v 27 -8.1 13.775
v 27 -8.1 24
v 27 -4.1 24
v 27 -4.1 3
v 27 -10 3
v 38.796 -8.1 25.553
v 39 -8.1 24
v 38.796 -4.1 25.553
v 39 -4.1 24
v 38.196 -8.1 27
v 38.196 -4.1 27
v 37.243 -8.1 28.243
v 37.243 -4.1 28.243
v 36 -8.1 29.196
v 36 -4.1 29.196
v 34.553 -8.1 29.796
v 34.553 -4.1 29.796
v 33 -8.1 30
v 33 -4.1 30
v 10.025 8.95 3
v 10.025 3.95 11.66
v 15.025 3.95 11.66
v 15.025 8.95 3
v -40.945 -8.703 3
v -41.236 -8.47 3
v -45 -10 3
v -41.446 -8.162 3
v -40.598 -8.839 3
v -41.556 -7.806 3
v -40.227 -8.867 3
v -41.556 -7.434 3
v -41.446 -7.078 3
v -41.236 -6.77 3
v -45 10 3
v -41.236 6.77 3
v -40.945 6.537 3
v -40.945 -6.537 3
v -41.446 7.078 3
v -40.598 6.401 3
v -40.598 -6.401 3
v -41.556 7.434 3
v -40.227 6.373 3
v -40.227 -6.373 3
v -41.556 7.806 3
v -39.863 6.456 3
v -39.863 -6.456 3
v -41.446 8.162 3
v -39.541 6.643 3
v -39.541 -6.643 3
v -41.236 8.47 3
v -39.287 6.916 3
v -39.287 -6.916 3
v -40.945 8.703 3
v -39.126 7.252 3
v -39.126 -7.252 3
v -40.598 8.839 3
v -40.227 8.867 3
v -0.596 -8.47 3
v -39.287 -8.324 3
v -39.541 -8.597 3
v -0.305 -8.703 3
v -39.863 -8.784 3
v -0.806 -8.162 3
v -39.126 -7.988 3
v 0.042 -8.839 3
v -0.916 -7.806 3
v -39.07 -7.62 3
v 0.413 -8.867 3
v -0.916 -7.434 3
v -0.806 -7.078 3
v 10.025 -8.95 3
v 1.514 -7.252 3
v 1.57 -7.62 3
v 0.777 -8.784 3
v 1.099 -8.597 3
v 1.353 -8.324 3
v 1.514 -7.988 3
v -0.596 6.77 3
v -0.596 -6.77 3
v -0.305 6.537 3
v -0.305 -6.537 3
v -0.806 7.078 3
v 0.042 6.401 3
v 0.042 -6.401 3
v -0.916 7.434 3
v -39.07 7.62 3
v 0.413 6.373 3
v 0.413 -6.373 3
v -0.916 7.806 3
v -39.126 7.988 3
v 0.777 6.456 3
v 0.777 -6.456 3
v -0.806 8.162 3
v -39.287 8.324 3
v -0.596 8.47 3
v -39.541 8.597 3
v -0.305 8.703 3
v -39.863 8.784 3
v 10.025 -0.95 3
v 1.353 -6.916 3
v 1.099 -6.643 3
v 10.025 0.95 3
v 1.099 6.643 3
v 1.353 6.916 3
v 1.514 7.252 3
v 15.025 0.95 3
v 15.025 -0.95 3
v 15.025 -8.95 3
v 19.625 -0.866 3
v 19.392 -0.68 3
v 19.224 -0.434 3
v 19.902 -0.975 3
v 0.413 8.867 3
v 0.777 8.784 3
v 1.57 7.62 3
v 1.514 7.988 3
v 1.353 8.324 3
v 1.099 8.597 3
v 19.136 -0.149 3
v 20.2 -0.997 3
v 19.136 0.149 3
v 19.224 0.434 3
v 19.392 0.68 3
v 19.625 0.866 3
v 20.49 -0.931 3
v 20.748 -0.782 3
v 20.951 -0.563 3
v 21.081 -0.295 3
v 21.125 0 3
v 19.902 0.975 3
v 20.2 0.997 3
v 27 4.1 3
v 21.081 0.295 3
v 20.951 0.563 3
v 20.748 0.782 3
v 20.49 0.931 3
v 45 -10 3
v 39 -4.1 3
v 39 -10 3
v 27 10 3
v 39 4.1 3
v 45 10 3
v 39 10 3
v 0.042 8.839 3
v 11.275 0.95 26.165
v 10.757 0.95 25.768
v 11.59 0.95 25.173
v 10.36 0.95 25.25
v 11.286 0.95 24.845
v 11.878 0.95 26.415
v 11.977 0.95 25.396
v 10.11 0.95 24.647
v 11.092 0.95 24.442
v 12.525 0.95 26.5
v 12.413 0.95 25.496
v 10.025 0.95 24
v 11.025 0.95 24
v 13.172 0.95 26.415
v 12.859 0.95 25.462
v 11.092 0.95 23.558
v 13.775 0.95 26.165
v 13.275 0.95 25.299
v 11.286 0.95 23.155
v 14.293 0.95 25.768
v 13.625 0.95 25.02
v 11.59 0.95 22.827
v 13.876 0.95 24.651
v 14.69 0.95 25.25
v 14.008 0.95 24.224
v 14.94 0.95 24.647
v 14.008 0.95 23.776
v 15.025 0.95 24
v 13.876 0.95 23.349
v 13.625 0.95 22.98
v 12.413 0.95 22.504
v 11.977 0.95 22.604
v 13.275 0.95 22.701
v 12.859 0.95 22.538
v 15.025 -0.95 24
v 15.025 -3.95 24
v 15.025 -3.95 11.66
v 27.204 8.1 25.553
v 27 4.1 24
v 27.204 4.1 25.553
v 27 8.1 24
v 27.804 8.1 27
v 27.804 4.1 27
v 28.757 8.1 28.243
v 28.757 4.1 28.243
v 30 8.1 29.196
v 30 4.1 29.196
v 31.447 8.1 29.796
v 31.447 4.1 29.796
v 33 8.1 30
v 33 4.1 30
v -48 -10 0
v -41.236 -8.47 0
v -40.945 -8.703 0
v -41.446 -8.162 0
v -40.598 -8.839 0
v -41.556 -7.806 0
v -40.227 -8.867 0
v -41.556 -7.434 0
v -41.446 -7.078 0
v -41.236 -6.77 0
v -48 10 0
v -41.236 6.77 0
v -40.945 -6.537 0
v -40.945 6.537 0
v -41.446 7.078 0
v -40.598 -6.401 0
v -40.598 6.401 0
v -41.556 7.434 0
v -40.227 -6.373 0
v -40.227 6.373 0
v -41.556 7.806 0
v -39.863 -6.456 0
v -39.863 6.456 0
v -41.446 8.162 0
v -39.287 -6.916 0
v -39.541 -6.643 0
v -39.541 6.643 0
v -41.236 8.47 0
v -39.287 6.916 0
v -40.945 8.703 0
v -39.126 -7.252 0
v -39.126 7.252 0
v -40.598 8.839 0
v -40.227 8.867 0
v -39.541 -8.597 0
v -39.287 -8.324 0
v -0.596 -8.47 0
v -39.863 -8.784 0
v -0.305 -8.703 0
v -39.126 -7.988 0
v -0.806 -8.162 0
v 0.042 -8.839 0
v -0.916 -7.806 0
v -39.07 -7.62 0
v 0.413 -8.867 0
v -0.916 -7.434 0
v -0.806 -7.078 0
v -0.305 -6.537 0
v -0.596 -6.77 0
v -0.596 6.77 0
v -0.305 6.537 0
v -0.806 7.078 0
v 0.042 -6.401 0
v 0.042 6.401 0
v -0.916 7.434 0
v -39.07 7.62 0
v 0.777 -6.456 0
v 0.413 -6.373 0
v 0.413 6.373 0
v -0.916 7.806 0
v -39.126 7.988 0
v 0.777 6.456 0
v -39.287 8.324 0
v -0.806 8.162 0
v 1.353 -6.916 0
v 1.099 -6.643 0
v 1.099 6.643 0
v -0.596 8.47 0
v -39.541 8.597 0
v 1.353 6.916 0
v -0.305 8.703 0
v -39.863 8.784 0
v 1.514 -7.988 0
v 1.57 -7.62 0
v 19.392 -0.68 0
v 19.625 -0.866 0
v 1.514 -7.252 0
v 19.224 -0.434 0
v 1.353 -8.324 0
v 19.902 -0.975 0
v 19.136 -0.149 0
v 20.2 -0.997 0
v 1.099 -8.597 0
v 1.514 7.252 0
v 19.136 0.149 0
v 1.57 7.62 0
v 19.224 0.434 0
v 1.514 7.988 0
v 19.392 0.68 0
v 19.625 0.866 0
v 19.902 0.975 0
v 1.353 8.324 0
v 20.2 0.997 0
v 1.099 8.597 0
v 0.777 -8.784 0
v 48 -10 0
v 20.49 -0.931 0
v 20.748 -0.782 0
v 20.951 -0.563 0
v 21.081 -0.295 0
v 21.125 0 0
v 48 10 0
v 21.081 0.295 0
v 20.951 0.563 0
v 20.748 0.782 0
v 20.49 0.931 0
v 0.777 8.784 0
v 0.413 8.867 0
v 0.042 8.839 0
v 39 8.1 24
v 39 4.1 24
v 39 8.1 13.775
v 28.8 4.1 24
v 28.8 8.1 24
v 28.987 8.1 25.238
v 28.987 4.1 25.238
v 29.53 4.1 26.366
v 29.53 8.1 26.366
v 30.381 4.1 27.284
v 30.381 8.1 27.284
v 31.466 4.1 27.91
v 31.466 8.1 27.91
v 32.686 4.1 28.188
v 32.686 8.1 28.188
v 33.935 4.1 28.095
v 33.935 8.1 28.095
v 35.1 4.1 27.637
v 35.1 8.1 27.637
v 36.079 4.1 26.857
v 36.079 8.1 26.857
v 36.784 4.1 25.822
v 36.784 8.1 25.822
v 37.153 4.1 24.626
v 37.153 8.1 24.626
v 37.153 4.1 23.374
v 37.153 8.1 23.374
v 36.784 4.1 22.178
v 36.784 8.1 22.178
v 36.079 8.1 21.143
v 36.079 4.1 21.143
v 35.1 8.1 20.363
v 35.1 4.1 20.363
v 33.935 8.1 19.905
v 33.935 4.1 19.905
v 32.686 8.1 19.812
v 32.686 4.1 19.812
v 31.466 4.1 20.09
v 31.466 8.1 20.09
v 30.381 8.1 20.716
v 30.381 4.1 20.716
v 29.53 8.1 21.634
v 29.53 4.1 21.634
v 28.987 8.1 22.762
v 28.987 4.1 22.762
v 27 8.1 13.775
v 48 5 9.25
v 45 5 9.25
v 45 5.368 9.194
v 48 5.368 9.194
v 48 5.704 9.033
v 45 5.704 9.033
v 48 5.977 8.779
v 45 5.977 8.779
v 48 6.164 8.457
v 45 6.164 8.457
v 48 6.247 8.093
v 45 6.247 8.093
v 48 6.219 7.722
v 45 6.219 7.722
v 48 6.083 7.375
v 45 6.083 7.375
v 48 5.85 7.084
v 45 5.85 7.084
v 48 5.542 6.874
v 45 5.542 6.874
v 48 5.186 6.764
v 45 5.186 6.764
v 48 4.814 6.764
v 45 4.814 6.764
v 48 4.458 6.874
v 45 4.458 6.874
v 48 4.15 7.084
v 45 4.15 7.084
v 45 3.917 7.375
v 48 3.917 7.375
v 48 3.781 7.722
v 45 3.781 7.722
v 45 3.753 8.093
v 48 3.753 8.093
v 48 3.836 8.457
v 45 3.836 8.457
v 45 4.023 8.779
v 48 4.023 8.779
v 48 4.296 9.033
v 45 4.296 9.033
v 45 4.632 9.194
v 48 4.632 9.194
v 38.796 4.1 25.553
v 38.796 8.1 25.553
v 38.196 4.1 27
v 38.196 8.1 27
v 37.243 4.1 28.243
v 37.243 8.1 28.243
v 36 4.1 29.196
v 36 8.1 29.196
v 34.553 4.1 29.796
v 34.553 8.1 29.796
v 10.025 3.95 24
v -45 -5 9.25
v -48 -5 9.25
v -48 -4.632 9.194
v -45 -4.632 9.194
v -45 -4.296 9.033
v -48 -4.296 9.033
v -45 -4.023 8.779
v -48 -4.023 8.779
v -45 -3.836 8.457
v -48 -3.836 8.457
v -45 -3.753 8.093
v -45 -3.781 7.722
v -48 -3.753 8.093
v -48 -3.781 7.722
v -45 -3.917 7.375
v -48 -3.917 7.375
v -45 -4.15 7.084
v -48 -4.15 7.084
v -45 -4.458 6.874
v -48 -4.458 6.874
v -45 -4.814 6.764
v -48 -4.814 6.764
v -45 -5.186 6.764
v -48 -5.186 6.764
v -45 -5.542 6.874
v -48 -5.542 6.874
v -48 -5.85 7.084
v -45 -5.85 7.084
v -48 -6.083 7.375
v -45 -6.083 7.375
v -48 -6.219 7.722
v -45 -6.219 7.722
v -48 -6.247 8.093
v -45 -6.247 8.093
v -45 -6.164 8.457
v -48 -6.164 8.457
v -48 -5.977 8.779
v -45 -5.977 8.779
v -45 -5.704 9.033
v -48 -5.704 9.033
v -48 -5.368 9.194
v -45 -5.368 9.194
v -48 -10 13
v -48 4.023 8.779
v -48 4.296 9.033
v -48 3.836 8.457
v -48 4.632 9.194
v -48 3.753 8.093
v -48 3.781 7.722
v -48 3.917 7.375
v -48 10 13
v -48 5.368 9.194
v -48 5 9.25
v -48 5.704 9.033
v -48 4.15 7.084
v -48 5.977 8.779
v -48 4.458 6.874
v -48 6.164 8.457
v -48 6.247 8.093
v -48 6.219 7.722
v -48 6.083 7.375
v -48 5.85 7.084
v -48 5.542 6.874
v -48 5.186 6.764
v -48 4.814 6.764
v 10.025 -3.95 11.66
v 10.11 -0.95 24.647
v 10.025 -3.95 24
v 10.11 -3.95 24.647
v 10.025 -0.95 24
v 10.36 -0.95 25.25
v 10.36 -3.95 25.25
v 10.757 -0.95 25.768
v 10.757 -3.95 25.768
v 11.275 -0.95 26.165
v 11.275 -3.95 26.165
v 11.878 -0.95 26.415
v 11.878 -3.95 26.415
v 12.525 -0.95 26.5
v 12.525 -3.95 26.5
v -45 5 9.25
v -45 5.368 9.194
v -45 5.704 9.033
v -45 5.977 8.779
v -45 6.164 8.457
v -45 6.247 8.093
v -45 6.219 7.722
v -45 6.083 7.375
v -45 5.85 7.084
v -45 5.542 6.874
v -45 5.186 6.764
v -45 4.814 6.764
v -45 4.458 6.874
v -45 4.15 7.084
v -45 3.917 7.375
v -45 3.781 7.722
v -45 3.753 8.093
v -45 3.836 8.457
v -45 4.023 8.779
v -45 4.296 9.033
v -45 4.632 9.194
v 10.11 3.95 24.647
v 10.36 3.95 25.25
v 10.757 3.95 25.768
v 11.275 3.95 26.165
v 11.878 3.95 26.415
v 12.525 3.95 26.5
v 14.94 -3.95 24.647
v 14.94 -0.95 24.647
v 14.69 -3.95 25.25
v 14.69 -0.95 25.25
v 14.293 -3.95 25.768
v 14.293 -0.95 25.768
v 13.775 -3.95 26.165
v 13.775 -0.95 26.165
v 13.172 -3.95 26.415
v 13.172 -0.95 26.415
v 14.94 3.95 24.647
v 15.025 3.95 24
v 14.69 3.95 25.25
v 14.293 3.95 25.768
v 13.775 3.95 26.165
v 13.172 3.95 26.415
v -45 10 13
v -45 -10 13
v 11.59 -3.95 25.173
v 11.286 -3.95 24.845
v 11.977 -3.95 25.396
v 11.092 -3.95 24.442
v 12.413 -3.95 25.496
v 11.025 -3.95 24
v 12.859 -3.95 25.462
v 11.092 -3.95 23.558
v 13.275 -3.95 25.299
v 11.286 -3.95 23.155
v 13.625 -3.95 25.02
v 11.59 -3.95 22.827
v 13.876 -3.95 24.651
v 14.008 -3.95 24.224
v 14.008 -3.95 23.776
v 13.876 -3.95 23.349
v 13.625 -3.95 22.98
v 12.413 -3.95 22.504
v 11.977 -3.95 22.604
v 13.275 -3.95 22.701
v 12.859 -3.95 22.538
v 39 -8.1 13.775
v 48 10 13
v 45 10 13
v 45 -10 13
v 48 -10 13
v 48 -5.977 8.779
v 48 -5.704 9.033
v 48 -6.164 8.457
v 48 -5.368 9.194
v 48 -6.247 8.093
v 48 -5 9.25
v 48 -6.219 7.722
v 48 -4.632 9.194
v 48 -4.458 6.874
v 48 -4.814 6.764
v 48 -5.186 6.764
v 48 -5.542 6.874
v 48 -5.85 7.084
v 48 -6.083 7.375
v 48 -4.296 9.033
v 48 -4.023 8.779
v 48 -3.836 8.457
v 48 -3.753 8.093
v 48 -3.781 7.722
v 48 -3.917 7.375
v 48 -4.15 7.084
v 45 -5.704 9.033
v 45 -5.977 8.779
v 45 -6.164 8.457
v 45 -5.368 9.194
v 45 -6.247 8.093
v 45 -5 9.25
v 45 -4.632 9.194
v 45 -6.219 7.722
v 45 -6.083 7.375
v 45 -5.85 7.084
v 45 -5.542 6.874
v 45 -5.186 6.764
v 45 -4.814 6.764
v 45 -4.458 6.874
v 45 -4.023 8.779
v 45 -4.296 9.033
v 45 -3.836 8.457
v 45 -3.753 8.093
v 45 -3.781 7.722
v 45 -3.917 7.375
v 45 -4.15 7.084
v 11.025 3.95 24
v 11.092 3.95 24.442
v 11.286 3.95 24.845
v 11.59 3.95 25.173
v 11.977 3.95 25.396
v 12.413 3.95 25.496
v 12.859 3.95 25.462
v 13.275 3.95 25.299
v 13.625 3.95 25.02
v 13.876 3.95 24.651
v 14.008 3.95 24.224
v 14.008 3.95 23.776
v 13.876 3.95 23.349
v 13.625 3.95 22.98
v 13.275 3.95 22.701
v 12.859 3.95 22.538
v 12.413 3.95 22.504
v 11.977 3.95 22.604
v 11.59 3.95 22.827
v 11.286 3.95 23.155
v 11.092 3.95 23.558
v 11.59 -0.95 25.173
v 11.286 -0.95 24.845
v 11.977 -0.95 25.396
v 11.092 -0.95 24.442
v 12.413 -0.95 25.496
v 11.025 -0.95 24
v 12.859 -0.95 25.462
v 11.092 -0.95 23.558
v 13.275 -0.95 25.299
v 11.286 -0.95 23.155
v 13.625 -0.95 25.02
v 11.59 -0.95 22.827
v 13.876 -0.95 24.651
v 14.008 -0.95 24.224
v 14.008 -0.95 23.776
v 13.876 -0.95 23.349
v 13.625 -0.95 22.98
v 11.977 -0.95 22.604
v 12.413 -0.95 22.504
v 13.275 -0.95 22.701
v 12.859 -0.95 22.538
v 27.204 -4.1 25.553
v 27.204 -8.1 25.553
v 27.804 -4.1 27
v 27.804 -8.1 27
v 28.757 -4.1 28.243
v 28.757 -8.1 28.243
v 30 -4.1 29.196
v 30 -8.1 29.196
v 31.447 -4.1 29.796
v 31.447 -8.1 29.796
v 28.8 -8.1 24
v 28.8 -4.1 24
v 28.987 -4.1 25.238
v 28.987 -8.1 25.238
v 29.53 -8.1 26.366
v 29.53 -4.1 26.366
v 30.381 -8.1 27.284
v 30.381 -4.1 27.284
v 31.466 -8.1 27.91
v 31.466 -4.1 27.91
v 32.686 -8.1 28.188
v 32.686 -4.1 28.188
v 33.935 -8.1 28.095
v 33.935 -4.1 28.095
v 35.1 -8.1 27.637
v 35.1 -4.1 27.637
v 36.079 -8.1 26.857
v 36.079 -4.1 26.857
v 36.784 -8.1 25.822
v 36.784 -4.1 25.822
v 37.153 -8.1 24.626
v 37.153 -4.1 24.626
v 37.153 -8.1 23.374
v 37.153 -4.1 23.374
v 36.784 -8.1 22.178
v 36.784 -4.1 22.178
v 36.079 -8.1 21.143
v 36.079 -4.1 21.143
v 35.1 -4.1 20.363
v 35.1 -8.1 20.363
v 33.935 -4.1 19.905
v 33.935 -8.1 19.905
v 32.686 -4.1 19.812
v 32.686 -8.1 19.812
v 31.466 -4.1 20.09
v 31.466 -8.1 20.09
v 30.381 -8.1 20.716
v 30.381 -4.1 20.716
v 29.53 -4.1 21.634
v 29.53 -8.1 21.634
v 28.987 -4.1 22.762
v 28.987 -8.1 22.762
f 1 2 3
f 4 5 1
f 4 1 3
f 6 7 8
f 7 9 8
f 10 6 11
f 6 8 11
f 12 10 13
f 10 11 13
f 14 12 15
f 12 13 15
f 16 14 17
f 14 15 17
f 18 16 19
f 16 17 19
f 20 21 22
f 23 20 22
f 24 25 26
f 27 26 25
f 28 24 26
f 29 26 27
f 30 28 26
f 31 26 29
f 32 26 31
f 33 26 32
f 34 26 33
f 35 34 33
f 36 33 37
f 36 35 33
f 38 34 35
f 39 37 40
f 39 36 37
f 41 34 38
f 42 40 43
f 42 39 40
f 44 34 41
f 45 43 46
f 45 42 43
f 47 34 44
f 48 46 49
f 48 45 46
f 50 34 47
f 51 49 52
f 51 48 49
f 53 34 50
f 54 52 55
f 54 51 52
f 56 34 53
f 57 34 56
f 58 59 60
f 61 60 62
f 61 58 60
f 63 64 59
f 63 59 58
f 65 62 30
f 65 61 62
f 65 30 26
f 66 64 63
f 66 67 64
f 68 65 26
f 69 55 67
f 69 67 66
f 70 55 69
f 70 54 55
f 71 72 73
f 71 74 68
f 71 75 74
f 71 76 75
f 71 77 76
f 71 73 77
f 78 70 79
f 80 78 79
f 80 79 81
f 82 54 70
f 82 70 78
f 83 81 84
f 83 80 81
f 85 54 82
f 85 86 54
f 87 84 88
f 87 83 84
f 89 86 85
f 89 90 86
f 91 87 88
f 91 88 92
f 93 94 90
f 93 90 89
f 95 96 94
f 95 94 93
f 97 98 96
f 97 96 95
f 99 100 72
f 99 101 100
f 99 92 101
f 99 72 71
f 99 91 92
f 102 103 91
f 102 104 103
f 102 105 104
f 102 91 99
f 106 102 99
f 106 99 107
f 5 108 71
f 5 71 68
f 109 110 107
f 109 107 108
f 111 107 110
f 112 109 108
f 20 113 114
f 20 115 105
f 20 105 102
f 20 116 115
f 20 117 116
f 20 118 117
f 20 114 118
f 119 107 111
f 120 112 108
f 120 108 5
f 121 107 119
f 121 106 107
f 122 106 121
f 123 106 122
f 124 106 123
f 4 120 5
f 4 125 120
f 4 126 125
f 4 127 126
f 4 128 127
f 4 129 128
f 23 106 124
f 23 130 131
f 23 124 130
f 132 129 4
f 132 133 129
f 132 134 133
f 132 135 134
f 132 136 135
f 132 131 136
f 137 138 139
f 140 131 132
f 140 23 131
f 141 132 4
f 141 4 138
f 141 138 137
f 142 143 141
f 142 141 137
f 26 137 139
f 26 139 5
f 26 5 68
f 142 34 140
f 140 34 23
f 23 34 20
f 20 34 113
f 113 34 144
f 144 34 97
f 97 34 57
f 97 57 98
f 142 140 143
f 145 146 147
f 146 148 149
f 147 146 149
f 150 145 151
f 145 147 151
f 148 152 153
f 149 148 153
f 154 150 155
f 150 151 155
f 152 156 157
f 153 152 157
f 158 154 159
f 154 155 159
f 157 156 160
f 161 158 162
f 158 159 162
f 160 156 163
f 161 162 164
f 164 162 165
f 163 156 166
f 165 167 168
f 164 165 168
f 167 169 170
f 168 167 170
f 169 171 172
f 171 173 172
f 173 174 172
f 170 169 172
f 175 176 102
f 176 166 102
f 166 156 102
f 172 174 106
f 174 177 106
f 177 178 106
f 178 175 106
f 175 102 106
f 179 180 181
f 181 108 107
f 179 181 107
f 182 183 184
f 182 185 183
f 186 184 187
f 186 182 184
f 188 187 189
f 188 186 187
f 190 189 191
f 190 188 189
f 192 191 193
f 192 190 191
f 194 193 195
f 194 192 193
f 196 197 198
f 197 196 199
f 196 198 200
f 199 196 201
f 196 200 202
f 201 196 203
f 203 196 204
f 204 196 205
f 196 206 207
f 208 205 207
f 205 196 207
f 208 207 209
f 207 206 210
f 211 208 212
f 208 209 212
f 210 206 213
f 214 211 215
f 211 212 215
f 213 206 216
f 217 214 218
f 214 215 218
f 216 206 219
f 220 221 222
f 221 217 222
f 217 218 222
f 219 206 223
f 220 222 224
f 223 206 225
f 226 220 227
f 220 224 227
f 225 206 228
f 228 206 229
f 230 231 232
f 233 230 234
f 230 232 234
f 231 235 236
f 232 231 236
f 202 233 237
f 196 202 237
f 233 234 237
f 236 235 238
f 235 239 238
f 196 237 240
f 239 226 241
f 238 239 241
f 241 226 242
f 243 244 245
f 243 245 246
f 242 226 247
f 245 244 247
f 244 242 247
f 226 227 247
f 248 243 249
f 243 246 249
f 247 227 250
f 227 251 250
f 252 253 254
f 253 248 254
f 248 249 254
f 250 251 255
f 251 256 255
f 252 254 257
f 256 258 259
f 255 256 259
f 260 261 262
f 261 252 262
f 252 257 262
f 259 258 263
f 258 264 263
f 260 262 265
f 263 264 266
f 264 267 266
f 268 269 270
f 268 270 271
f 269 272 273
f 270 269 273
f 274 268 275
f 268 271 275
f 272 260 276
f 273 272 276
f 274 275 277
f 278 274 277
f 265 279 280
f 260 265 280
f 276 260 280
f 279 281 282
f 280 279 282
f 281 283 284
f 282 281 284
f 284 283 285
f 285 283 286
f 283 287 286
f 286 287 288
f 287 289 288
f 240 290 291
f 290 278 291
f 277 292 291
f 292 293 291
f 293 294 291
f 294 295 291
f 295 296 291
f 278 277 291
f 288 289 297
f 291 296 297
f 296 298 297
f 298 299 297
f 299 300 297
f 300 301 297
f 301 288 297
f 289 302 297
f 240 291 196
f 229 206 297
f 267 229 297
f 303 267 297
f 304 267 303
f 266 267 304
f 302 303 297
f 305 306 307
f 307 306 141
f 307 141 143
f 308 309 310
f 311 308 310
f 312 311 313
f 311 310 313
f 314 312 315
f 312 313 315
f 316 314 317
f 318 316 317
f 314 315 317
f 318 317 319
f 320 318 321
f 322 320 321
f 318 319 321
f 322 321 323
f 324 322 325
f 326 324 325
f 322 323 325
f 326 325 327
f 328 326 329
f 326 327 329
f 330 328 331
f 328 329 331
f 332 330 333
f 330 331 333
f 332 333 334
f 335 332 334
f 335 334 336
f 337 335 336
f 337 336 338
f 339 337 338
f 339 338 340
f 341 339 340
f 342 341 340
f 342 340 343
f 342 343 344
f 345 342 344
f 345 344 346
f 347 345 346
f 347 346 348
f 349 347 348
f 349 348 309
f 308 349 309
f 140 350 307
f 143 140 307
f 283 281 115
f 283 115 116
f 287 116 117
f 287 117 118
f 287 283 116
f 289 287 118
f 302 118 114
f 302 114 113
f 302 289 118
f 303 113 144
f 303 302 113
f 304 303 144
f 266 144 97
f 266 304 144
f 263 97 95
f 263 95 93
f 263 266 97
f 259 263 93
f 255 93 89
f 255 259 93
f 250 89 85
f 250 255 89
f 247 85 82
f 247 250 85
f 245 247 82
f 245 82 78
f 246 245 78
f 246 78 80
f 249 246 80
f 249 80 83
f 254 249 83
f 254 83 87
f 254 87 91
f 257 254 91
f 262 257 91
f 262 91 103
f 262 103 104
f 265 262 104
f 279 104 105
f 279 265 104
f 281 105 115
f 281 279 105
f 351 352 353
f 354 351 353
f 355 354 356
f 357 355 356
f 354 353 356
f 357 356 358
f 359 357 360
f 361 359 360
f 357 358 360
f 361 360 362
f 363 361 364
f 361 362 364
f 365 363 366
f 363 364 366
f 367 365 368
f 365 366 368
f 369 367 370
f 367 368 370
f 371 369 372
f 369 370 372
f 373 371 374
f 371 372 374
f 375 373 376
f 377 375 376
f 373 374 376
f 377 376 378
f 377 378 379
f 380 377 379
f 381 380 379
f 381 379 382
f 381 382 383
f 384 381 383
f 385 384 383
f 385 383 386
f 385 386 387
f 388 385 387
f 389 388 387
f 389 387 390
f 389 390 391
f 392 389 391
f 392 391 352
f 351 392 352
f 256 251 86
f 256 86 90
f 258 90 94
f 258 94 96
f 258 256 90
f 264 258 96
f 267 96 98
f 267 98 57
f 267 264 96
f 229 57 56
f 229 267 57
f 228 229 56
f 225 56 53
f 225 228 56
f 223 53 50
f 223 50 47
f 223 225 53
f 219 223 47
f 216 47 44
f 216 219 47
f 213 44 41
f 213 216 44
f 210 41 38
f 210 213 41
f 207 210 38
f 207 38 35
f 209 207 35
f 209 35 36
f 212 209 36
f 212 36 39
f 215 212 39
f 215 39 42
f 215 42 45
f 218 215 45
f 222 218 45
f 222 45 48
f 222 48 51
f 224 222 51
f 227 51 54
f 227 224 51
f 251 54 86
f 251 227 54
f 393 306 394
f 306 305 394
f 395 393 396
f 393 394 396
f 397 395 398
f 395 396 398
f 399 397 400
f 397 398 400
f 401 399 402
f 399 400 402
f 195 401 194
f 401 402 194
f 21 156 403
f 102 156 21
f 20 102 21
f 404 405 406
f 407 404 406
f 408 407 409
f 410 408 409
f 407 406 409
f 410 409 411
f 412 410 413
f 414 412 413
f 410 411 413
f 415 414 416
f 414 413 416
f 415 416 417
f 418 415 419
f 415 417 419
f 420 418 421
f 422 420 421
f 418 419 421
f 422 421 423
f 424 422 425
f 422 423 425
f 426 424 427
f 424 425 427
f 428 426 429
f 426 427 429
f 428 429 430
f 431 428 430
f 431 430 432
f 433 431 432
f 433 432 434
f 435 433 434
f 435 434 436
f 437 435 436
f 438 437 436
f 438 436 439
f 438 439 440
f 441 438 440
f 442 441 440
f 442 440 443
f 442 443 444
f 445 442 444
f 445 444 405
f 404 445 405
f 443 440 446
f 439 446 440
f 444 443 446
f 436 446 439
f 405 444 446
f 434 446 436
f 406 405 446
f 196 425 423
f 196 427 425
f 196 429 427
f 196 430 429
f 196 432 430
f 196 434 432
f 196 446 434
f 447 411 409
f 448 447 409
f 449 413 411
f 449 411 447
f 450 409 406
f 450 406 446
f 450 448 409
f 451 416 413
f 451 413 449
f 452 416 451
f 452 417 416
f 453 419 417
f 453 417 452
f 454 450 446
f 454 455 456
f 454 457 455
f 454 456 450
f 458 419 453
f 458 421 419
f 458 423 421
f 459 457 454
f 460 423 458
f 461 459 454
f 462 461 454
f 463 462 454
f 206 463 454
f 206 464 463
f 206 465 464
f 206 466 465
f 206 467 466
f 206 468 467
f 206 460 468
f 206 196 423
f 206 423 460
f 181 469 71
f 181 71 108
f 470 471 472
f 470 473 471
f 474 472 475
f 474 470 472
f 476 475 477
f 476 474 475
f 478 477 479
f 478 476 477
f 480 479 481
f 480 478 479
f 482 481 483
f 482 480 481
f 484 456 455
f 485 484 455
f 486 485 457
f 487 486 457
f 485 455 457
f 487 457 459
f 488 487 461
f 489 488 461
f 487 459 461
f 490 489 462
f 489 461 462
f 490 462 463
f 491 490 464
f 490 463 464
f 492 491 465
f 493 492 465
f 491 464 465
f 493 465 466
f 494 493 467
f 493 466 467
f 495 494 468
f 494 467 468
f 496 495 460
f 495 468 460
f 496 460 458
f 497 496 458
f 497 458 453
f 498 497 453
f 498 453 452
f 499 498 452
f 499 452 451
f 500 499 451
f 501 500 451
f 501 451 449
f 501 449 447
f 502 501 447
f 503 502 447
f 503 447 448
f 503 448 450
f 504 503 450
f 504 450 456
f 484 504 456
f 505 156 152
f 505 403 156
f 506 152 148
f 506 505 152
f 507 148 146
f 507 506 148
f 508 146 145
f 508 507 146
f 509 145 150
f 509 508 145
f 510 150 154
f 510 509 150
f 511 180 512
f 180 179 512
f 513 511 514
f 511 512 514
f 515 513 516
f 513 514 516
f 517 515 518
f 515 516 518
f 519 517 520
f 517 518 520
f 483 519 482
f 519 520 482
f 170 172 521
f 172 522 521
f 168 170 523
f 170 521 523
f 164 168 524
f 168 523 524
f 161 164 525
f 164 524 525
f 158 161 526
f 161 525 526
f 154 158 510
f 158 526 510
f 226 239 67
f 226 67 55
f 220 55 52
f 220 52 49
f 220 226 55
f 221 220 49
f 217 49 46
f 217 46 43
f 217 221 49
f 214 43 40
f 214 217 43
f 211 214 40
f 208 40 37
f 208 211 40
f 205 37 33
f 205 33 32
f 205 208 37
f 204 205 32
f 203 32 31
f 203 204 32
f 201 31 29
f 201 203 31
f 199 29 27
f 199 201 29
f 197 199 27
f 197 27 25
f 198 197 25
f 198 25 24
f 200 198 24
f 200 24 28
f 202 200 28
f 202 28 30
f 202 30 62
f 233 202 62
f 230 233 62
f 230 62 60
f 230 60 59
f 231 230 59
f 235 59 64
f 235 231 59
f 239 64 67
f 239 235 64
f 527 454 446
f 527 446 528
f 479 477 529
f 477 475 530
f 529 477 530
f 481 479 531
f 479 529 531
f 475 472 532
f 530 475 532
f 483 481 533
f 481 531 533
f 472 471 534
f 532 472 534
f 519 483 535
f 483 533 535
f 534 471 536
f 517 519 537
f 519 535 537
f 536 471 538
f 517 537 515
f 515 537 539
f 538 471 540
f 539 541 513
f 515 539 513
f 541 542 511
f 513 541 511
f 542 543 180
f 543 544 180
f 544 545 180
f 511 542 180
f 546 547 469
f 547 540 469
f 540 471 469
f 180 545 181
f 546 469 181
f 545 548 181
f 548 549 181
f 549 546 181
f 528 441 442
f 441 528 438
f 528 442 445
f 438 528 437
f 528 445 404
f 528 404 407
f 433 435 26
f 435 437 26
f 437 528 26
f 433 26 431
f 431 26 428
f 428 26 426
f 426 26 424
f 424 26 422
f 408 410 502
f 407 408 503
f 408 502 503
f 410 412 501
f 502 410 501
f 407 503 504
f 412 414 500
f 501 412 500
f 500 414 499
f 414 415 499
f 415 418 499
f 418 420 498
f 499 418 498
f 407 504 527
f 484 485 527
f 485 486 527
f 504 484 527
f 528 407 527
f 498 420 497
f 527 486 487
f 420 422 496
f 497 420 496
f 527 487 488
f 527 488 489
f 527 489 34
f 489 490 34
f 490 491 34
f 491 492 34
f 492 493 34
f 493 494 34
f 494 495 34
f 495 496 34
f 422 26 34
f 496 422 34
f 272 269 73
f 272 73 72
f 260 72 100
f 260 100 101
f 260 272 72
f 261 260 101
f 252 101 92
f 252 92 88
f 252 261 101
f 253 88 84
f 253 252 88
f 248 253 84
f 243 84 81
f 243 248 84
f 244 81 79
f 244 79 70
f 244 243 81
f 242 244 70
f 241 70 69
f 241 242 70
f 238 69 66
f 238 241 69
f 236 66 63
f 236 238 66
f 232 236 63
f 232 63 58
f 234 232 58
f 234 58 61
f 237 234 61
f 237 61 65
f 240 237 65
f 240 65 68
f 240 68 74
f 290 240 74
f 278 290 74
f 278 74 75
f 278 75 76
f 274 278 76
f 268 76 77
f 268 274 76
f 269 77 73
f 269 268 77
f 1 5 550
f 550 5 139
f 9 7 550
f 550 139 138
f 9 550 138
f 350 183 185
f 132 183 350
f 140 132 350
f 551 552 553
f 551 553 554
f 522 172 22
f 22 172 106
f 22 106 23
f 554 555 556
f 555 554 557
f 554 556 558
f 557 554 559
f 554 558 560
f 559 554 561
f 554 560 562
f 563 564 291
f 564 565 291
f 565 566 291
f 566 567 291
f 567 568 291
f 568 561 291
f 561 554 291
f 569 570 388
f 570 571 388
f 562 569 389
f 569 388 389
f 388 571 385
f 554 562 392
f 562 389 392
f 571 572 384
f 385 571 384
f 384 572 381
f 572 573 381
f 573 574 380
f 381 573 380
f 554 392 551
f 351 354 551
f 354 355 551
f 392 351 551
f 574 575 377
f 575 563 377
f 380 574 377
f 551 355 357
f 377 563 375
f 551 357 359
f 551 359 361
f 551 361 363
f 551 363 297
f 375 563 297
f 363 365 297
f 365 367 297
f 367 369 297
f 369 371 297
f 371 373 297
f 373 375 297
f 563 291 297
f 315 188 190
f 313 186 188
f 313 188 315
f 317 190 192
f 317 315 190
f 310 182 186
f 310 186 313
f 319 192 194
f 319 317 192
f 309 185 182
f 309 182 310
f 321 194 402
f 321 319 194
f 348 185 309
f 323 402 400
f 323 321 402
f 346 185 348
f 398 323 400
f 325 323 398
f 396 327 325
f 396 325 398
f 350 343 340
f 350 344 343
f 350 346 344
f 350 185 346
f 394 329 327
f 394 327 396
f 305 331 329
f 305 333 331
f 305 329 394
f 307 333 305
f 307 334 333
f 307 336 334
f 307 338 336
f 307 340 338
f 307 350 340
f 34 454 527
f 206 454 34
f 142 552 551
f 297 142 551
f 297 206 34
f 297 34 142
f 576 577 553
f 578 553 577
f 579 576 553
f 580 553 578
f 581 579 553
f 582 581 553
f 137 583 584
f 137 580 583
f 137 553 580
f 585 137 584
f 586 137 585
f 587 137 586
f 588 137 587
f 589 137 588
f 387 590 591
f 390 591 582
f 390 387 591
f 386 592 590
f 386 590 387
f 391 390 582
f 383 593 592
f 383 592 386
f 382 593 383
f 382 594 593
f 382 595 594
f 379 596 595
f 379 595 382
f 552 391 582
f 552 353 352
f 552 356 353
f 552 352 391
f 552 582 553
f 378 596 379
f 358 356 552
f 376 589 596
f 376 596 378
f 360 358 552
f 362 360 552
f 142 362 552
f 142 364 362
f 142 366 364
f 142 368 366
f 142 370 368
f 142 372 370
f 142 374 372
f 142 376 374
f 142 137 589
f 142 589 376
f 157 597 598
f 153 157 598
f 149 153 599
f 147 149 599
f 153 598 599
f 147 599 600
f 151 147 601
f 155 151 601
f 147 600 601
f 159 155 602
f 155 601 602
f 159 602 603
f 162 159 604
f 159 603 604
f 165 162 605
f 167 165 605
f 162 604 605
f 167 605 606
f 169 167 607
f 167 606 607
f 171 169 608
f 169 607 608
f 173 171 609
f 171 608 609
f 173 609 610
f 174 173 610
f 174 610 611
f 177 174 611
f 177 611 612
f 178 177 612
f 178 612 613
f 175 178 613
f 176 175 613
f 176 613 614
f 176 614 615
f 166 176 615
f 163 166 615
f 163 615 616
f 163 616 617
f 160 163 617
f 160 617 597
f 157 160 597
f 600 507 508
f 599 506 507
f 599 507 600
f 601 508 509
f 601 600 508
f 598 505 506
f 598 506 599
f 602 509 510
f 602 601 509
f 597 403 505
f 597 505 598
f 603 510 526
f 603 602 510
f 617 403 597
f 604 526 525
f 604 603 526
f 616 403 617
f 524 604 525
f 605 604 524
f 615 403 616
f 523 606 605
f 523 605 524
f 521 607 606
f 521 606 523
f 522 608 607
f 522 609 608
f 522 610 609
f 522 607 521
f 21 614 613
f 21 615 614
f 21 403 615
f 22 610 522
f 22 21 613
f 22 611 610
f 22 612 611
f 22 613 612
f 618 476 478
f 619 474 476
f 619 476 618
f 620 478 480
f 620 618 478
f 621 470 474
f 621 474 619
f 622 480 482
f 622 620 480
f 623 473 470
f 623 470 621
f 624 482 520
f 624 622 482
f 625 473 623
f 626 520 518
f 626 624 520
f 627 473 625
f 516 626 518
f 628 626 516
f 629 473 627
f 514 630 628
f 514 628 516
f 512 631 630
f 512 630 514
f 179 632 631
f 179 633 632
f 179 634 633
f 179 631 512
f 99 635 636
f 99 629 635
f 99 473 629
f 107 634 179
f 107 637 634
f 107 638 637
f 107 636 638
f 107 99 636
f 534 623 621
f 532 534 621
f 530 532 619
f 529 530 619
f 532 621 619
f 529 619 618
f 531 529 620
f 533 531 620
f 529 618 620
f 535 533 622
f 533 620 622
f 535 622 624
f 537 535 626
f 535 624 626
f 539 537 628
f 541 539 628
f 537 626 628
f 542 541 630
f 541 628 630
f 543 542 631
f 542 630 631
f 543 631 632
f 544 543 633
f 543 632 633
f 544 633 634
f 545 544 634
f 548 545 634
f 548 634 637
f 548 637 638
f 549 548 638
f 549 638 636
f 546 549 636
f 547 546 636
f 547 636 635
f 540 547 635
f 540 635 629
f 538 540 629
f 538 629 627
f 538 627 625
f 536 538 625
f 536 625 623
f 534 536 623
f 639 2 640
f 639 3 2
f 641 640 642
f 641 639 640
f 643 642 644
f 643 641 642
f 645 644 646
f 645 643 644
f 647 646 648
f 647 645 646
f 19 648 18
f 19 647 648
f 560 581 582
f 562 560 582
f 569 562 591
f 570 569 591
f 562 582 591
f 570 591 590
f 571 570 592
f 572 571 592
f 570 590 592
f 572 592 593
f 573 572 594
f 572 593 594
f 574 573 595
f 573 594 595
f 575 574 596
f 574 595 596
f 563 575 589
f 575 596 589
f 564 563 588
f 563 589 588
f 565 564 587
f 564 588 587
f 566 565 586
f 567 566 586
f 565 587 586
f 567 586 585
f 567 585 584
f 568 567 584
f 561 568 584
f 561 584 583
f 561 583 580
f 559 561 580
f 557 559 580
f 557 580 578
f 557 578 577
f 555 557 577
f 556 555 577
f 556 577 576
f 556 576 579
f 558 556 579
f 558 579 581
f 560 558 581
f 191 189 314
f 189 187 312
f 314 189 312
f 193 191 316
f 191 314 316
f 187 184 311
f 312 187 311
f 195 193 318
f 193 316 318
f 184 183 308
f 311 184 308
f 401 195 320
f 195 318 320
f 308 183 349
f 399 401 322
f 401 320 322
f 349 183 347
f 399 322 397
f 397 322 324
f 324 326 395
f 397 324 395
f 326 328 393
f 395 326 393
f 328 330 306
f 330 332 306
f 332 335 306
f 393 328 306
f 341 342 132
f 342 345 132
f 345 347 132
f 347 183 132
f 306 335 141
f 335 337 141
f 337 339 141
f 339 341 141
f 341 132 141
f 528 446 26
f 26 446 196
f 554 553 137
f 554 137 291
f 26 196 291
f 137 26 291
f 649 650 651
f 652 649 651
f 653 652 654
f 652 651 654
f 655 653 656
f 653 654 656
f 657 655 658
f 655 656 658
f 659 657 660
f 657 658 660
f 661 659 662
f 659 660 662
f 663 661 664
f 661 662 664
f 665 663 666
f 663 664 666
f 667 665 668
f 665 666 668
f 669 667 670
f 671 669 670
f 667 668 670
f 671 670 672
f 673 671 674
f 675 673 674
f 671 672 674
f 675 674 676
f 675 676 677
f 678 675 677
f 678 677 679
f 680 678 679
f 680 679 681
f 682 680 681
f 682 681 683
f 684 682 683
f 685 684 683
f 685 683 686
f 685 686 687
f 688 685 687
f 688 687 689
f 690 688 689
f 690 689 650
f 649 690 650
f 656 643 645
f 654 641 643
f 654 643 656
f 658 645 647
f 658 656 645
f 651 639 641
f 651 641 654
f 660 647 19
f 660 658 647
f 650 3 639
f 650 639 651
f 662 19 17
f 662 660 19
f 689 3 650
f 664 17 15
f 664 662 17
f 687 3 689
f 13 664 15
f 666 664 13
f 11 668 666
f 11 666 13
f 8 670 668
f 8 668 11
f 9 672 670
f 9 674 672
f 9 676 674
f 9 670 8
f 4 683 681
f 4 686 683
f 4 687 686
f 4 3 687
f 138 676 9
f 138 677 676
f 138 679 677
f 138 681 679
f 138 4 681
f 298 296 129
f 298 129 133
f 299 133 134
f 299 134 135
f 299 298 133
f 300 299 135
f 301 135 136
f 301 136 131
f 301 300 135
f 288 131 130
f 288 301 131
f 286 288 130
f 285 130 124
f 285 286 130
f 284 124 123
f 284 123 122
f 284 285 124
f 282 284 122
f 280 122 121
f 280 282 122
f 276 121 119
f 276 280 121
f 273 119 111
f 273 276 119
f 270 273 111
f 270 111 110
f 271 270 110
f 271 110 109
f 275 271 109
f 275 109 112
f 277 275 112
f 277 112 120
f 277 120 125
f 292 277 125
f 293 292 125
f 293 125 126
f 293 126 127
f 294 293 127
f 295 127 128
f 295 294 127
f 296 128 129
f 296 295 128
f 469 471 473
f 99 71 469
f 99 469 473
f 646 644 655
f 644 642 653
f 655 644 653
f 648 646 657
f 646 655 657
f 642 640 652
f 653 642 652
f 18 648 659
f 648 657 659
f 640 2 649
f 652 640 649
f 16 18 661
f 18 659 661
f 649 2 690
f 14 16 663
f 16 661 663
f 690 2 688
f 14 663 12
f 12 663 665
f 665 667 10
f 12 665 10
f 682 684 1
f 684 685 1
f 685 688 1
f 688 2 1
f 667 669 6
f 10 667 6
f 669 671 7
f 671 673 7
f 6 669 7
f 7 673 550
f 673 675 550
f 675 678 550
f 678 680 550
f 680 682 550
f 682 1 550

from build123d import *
from OCP.BRepFilletAPI import BRepFilletAPI_MakeChamfer

# Parameters (mm, degrees)
SCHIZZO1_W                   = 96
SCHIZZO1_H                   = 20
SCHIZZO1_R                   = 1
SCHIZZO1_R_2                 = 1.25
ESTRUSIONE_ESTRUSIONE1_DEPTH = 3
SCHIZZO2_W                   = 3
SCHIZZO2_H                   = 20
ESTRUSIONE_ESTRUSIONE2_DEPTH = 10
SCHIZZO3_R                   = 1.25
TAGLIO_ESTRUSIONE1_DEPTH     = 98.390964673
SCHIZZO4_W                   = 12
SCHIZZO4_H                   = 4
ESTRUSIONE_ESTRUSIONE3_DEPTH = 27
RACCORDO1_R                  = 6
SCHIZZO5_R                   = 4.2
TAGLIO_ESTRUSIONE2_DEPTH     = 60.427350606
SMUSSO1_SIZE                 = 10.775435457
SMUSSO1_SIZE_2               = 1.9
SCHIZZO6_W                   = 5
SCHIZZO6_H                   = 3
ESTRUSIONE_ESTRUSIONE4_DEPTH = 23.5
RACCORDO2_R                  = 2.5
SCHIZZO7_R                   = 1.5
TAGLIO_ESTRUSIONE3_DEPTH     = 59.297534253
SMUSSO2_SIZE                 = 5
SMUSSO2_SIZE2                = 8.660254038


with BuildPart() as part:
    # Schizzo1 → Estrusione-Estrusione1 (new body)
    with BuildSketch(Plane.XY):
        Rectangle(SCHIZZO1_W, SCHIZZO1_H)
        with Locations((20.125, 0)):
            Circle(SCHIZZO1_R, mode=Mode.SUBTRACT)
        with Locations((-40.32, 7.62)):
            Circle(SCHIZZO1_R_2, mode=Mode.SUBTRACT)
        with Locations((0.32, 7.62)):
            Circle(SCHIZZO1_R_2, mode=Mode.SUBTRACT)
        with Locations((0.32, -7.62)):
            Circle(SCHIZZO1_R_2, mode=Mode.SUBTRACT)
        with Locations((-40.32, -7.62)):
            Circle(SCHIZZO1_R_2, mode=Mode.SUBTRACT)
    extrude(amount=ESTRUSIONE_ESTRUSIONE1_DEPTH)

    # Schizzo2 → Estrusione-Estrusione2 (add)
    with BuildSketch(Plane.XY.offset(3)):
        with Locations((-46.5, 0)):
            Rectangle(SCHIZZO2_W, SCHIZZO2_H)
        with Locations((46.5, 0)):
            Rectangle(SCHIZZO2_W, SCHIZZO2_H)
    extrude(amount=ESTRUSIONE_ESTRUSIONE2_DEPTH)

    # Schizzo3 → Taglio-Estrusione1 (cut, through all)
    with BuildSketch(Plane.ZY.offset(48)):
        with Locations((8, -5)):
            Circle(SCHIZZO3_R)
        with Locations((8, 5)):
            Circle(SCHIZZO3_R)
    extrude(amount=-TAGLIO_ESTRUSIONE1_DEPTH, mode=Mode.SUBTRACT)

    # Schizzo4 → Estrusione-Estrusione3 (add)
    with BuildSketch(Plane.XY.offset(3)):
        with Locations((33, -6.1)):
            Rectangle(SCHIZZO4_W, SCHIZZO4_H)
        with Locations((33, 6.1)):
            Rectangle(SCHIZZO4_W, SCHIZZO4_H)
    extrude(amount=ESTRUSIONE_ESTRUSIONE3_DEPTH)

    # Raccordo1
    raccordo1_edges = [part.edges().sort_by_distance(p)[0] for p in [
        (27, 6.1, 30),
        (39, 6.1, 30),
        (39, -6.1, 30),
        (27, -6.1, 30),
    ]]
    fillet(raccordo1_edges, radius=RACCORDO1_R - 0.0001)  # a hair under: the kernel refuses the full size

    # Schizzo5 → Taglio-Estrusione2 (cut, through all)
    with BuildSketch(Plane(origin=(0, 8.1, 0), x_dir=(1, 0, 0), z_dir=(0, 1, 0))):
        with Locations(Location((33, -24, 0), (0, 0, 180))):
            Circle(SCHIZZO5_R)
    extrude(amount=-TAGLIO_ESTRUSIONE2_DEPTH, mode=Mode.SUBTRACT)

    # Smusso1
    smusso1_edges_1 = [part.edges().sort_by_distance(p)[0] for p in [
        (33, -8.1, 3),
    ]]
    smusso1_side_1 = [part.faces().sort_by_distance(p)[0] for p in [
        (33, -8.1, 3.038),
    ]]
    smusso1_edges_2 = [part.edges().sort_by_distance(p)[0] for p in [
        (33, 8.1, 3),
    ]]
    smusso1_side_2 = [part.faces().sort_by_distance(p)[0] for p in [
        (33, 8.138, 3),
    ]]
    smusso1 = BRepFilletAPI_MakeChamfer(part.part.solid().wrapped)
    for e in smusso1_edges_1:
        smusso1.Add(SMUSSO1_SIZE - 0.0001, SMUSSO1_SIZE_2 - 0.0001, e.wrapped, smusso1_side_1[0].wrapped)
    for e in smusso1_edges_2:
        smusso1.Add(SMUSSO1_SIZE_2 - 0.0001, SMUSSO1_SIZE - 0.0001, e.wrapped, smusso1_side_2[0].wrapped)
    add(Compound.cast(smusso1.Shape()), mode=Mode.REPLACE)  # a hair under: the kernel refuses the full size

    # Schizzo6 → Estrusione-Estrusione4 (add)
    with BuildSketch(Plane.XY.offset(3)):
        with Locations((12.525, 2.45)):
            Rectangle(SCHIZZO6_W, SCHIZZO6_H)
        with Locations((12.525, -2.45)):
            Rectangle(SCHIZZO6_W, SCHIZZO6_H)
    extrude(amount=ESTRUSIONE_ESTRUSIONE4_DEPTH)

    # Raccordo2
    raccordo2_edges = [part.edges().sort_by_distance(p)[0] for p in [
        (15.025, -2.45, 26.5),
        (10.025, -2.45, 26.5),
        (15.025, 2.45, 26.5),
        (10.025, 2.45, 26.5),
    ]]
    fillet(raccordo2_edges, radius=RACCORDO2_R - 0.0001)  # a hair under: the kernel refuses the full size

    # Schizzo7 → Taglio-Estrusione3 (cut, through all)
    with BuildSketch(Plane(origin=(0, 3.95, 0), x_dir=(1, 0, 0), z_dir=(0, 1, 0))):
        with Locations(Location((12.525, -24, 0), (0, 0, 180))):
            Circle(SCHIZZO7_R)
    extrude(amount=-TAGLIO_ESTRUSIONE3_DEPTH, mode=Mode.SUBTRACT)

    # Smusso2
    smusso2_edges = [part.edges().sort_by_distance(p)[0] for p in [
        (12.525, 3.95, 3),
        (12.525, -3.95, 3),
    ]]
    smusso2_side = [part.faces().sort_by_distance(p)[0] for p in [
        (-2.939038544, 0, 3),
    ]]
    chamfer(smusso2_edges, length=SMUSSO2_SIZE, length2=SMUSSO2_SIZE2, reference=smusso2_side[0])


solid = part.part
